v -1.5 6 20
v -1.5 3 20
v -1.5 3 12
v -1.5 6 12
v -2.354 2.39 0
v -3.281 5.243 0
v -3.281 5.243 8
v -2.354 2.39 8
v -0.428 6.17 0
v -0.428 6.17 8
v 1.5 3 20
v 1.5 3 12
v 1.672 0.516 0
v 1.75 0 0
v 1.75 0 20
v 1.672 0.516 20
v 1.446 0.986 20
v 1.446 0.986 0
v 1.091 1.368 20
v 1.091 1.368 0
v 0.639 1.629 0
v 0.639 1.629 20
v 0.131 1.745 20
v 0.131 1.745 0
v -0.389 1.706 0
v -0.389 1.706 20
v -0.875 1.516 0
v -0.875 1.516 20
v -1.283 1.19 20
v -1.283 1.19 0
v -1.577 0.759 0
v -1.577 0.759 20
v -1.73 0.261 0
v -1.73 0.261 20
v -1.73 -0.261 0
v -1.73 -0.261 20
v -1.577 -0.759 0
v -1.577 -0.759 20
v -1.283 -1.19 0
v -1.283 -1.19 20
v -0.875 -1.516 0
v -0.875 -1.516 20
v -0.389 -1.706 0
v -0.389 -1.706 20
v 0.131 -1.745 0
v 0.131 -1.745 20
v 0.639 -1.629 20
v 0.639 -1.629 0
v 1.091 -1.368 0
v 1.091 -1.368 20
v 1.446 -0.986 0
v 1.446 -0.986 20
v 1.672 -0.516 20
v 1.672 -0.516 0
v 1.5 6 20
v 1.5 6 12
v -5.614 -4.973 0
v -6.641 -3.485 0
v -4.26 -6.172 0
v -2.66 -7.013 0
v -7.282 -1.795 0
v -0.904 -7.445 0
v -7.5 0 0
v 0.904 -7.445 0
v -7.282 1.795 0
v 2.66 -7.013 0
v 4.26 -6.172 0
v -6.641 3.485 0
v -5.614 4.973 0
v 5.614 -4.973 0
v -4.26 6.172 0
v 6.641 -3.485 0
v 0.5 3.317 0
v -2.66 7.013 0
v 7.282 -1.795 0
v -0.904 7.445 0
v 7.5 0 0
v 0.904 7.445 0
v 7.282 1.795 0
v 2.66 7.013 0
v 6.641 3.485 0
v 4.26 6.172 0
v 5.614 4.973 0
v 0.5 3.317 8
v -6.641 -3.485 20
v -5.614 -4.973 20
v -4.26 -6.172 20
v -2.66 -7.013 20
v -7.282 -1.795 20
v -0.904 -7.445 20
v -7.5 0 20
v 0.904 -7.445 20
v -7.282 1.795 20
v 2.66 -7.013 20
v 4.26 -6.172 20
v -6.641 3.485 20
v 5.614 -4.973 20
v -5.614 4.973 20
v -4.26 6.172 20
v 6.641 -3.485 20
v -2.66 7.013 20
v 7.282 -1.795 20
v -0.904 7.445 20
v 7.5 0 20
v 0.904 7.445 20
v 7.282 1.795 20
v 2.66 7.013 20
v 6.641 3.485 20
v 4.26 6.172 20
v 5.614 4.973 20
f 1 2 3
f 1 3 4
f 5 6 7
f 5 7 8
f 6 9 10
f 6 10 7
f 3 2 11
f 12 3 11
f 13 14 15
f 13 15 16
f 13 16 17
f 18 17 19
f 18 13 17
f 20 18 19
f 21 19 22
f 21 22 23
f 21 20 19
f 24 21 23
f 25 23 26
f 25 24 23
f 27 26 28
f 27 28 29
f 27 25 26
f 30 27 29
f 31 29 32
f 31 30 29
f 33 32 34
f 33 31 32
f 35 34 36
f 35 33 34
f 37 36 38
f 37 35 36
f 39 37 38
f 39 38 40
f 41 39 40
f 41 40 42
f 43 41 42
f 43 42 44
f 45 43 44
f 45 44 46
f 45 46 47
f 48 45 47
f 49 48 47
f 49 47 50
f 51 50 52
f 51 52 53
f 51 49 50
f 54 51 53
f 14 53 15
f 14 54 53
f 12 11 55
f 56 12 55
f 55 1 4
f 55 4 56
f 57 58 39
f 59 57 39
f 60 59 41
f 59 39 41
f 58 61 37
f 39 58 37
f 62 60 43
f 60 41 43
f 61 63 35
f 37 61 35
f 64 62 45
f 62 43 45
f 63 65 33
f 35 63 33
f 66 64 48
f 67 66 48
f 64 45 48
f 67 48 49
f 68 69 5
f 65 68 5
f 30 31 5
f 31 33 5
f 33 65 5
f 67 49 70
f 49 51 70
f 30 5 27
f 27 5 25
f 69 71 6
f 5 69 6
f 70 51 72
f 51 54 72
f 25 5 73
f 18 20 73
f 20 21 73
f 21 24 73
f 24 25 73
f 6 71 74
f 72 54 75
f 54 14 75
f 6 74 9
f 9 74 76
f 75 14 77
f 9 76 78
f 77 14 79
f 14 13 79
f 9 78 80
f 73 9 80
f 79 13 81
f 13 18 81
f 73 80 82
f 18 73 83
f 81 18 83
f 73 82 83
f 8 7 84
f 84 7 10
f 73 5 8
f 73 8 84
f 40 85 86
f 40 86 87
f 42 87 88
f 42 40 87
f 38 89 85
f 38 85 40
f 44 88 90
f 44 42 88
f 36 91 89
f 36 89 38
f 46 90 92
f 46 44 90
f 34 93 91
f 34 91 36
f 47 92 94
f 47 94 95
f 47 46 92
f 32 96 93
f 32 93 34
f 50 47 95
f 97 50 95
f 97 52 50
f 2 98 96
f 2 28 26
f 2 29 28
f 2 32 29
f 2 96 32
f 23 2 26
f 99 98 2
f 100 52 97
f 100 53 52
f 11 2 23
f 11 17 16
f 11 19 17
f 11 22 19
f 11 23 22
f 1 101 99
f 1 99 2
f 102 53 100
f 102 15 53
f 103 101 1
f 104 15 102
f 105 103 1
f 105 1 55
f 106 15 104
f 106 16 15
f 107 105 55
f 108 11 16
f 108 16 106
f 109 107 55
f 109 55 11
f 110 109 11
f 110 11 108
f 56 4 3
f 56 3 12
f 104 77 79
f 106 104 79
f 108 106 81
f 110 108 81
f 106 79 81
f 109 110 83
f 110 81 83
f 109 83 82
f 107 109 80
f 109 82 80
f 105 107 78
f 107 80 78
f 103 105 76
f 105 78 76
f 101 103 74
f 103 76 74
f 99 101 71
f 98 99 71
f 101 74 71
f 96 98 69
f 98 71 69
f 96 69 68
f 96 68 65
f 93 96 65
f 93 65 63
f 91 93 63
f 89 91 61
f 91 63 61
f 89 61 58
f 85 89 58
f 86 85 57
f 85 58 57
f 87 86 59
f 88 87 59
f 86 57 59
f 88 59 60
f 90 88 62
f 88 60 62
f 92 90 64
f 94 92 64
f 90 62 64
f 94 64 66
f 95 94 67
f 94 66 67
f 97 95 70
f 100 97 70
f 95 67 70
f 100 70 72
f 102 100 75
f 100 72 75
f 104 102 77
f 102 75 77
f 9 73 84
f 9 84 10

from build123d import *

# Parameters (mm, degrees)
SKETCH1_R           = 7.5
SKETCH1_R_2         = 1.75
BOSS_EXTRUDE1_DEPTH = 20
SKETCH2_W           = 3
SKETCH2_H           = 3
CUT_EXTRUDE1_DEPTH  = 8
CUT_EXTRUDE2_DEPTH  = 8


with BuildPart() as part:
    # Sketch1 → Boss-Extrude1 (new body)
    with BuildSketch(Plane.XY):
        Circle(SKETCH1_R)
        Circle(SKETCH1_R_2, mode=Mode.SUBTRACT)
    extrude(amount=BOSS_EXTRUDE1_DEPTH)

    # Sketch2 → Cut-Extrude1 (cut)
    with BuildSketch(Plane.XY.offset(20)):
        with Locations((0, 4.5)):
            Rectangle(SKETCH2_W, SKETCH2_H)
    extrude(amount=-CUT_EXTRUDE1_DEPTH, mode=Mode.SUBTRACT)

    # Sketch3 → Cut-Extrude2 (cut)
    with BuildSketch(Plane(origin=(0, 0, 0), x_dir=(-1, 0, 0), z_dir=(0, 0, -1))):
        Polygon((-0.499533791, 3.31669504), (0.427517192, 6.169864589), (3.280686741, 5.242813606), (2.353635758, 2.389644057), align=None)
    extrude(amount=-CUT_EXTRUDE2_DEPTH, mode=Mode.SUBTRACT)


solid = part.part
